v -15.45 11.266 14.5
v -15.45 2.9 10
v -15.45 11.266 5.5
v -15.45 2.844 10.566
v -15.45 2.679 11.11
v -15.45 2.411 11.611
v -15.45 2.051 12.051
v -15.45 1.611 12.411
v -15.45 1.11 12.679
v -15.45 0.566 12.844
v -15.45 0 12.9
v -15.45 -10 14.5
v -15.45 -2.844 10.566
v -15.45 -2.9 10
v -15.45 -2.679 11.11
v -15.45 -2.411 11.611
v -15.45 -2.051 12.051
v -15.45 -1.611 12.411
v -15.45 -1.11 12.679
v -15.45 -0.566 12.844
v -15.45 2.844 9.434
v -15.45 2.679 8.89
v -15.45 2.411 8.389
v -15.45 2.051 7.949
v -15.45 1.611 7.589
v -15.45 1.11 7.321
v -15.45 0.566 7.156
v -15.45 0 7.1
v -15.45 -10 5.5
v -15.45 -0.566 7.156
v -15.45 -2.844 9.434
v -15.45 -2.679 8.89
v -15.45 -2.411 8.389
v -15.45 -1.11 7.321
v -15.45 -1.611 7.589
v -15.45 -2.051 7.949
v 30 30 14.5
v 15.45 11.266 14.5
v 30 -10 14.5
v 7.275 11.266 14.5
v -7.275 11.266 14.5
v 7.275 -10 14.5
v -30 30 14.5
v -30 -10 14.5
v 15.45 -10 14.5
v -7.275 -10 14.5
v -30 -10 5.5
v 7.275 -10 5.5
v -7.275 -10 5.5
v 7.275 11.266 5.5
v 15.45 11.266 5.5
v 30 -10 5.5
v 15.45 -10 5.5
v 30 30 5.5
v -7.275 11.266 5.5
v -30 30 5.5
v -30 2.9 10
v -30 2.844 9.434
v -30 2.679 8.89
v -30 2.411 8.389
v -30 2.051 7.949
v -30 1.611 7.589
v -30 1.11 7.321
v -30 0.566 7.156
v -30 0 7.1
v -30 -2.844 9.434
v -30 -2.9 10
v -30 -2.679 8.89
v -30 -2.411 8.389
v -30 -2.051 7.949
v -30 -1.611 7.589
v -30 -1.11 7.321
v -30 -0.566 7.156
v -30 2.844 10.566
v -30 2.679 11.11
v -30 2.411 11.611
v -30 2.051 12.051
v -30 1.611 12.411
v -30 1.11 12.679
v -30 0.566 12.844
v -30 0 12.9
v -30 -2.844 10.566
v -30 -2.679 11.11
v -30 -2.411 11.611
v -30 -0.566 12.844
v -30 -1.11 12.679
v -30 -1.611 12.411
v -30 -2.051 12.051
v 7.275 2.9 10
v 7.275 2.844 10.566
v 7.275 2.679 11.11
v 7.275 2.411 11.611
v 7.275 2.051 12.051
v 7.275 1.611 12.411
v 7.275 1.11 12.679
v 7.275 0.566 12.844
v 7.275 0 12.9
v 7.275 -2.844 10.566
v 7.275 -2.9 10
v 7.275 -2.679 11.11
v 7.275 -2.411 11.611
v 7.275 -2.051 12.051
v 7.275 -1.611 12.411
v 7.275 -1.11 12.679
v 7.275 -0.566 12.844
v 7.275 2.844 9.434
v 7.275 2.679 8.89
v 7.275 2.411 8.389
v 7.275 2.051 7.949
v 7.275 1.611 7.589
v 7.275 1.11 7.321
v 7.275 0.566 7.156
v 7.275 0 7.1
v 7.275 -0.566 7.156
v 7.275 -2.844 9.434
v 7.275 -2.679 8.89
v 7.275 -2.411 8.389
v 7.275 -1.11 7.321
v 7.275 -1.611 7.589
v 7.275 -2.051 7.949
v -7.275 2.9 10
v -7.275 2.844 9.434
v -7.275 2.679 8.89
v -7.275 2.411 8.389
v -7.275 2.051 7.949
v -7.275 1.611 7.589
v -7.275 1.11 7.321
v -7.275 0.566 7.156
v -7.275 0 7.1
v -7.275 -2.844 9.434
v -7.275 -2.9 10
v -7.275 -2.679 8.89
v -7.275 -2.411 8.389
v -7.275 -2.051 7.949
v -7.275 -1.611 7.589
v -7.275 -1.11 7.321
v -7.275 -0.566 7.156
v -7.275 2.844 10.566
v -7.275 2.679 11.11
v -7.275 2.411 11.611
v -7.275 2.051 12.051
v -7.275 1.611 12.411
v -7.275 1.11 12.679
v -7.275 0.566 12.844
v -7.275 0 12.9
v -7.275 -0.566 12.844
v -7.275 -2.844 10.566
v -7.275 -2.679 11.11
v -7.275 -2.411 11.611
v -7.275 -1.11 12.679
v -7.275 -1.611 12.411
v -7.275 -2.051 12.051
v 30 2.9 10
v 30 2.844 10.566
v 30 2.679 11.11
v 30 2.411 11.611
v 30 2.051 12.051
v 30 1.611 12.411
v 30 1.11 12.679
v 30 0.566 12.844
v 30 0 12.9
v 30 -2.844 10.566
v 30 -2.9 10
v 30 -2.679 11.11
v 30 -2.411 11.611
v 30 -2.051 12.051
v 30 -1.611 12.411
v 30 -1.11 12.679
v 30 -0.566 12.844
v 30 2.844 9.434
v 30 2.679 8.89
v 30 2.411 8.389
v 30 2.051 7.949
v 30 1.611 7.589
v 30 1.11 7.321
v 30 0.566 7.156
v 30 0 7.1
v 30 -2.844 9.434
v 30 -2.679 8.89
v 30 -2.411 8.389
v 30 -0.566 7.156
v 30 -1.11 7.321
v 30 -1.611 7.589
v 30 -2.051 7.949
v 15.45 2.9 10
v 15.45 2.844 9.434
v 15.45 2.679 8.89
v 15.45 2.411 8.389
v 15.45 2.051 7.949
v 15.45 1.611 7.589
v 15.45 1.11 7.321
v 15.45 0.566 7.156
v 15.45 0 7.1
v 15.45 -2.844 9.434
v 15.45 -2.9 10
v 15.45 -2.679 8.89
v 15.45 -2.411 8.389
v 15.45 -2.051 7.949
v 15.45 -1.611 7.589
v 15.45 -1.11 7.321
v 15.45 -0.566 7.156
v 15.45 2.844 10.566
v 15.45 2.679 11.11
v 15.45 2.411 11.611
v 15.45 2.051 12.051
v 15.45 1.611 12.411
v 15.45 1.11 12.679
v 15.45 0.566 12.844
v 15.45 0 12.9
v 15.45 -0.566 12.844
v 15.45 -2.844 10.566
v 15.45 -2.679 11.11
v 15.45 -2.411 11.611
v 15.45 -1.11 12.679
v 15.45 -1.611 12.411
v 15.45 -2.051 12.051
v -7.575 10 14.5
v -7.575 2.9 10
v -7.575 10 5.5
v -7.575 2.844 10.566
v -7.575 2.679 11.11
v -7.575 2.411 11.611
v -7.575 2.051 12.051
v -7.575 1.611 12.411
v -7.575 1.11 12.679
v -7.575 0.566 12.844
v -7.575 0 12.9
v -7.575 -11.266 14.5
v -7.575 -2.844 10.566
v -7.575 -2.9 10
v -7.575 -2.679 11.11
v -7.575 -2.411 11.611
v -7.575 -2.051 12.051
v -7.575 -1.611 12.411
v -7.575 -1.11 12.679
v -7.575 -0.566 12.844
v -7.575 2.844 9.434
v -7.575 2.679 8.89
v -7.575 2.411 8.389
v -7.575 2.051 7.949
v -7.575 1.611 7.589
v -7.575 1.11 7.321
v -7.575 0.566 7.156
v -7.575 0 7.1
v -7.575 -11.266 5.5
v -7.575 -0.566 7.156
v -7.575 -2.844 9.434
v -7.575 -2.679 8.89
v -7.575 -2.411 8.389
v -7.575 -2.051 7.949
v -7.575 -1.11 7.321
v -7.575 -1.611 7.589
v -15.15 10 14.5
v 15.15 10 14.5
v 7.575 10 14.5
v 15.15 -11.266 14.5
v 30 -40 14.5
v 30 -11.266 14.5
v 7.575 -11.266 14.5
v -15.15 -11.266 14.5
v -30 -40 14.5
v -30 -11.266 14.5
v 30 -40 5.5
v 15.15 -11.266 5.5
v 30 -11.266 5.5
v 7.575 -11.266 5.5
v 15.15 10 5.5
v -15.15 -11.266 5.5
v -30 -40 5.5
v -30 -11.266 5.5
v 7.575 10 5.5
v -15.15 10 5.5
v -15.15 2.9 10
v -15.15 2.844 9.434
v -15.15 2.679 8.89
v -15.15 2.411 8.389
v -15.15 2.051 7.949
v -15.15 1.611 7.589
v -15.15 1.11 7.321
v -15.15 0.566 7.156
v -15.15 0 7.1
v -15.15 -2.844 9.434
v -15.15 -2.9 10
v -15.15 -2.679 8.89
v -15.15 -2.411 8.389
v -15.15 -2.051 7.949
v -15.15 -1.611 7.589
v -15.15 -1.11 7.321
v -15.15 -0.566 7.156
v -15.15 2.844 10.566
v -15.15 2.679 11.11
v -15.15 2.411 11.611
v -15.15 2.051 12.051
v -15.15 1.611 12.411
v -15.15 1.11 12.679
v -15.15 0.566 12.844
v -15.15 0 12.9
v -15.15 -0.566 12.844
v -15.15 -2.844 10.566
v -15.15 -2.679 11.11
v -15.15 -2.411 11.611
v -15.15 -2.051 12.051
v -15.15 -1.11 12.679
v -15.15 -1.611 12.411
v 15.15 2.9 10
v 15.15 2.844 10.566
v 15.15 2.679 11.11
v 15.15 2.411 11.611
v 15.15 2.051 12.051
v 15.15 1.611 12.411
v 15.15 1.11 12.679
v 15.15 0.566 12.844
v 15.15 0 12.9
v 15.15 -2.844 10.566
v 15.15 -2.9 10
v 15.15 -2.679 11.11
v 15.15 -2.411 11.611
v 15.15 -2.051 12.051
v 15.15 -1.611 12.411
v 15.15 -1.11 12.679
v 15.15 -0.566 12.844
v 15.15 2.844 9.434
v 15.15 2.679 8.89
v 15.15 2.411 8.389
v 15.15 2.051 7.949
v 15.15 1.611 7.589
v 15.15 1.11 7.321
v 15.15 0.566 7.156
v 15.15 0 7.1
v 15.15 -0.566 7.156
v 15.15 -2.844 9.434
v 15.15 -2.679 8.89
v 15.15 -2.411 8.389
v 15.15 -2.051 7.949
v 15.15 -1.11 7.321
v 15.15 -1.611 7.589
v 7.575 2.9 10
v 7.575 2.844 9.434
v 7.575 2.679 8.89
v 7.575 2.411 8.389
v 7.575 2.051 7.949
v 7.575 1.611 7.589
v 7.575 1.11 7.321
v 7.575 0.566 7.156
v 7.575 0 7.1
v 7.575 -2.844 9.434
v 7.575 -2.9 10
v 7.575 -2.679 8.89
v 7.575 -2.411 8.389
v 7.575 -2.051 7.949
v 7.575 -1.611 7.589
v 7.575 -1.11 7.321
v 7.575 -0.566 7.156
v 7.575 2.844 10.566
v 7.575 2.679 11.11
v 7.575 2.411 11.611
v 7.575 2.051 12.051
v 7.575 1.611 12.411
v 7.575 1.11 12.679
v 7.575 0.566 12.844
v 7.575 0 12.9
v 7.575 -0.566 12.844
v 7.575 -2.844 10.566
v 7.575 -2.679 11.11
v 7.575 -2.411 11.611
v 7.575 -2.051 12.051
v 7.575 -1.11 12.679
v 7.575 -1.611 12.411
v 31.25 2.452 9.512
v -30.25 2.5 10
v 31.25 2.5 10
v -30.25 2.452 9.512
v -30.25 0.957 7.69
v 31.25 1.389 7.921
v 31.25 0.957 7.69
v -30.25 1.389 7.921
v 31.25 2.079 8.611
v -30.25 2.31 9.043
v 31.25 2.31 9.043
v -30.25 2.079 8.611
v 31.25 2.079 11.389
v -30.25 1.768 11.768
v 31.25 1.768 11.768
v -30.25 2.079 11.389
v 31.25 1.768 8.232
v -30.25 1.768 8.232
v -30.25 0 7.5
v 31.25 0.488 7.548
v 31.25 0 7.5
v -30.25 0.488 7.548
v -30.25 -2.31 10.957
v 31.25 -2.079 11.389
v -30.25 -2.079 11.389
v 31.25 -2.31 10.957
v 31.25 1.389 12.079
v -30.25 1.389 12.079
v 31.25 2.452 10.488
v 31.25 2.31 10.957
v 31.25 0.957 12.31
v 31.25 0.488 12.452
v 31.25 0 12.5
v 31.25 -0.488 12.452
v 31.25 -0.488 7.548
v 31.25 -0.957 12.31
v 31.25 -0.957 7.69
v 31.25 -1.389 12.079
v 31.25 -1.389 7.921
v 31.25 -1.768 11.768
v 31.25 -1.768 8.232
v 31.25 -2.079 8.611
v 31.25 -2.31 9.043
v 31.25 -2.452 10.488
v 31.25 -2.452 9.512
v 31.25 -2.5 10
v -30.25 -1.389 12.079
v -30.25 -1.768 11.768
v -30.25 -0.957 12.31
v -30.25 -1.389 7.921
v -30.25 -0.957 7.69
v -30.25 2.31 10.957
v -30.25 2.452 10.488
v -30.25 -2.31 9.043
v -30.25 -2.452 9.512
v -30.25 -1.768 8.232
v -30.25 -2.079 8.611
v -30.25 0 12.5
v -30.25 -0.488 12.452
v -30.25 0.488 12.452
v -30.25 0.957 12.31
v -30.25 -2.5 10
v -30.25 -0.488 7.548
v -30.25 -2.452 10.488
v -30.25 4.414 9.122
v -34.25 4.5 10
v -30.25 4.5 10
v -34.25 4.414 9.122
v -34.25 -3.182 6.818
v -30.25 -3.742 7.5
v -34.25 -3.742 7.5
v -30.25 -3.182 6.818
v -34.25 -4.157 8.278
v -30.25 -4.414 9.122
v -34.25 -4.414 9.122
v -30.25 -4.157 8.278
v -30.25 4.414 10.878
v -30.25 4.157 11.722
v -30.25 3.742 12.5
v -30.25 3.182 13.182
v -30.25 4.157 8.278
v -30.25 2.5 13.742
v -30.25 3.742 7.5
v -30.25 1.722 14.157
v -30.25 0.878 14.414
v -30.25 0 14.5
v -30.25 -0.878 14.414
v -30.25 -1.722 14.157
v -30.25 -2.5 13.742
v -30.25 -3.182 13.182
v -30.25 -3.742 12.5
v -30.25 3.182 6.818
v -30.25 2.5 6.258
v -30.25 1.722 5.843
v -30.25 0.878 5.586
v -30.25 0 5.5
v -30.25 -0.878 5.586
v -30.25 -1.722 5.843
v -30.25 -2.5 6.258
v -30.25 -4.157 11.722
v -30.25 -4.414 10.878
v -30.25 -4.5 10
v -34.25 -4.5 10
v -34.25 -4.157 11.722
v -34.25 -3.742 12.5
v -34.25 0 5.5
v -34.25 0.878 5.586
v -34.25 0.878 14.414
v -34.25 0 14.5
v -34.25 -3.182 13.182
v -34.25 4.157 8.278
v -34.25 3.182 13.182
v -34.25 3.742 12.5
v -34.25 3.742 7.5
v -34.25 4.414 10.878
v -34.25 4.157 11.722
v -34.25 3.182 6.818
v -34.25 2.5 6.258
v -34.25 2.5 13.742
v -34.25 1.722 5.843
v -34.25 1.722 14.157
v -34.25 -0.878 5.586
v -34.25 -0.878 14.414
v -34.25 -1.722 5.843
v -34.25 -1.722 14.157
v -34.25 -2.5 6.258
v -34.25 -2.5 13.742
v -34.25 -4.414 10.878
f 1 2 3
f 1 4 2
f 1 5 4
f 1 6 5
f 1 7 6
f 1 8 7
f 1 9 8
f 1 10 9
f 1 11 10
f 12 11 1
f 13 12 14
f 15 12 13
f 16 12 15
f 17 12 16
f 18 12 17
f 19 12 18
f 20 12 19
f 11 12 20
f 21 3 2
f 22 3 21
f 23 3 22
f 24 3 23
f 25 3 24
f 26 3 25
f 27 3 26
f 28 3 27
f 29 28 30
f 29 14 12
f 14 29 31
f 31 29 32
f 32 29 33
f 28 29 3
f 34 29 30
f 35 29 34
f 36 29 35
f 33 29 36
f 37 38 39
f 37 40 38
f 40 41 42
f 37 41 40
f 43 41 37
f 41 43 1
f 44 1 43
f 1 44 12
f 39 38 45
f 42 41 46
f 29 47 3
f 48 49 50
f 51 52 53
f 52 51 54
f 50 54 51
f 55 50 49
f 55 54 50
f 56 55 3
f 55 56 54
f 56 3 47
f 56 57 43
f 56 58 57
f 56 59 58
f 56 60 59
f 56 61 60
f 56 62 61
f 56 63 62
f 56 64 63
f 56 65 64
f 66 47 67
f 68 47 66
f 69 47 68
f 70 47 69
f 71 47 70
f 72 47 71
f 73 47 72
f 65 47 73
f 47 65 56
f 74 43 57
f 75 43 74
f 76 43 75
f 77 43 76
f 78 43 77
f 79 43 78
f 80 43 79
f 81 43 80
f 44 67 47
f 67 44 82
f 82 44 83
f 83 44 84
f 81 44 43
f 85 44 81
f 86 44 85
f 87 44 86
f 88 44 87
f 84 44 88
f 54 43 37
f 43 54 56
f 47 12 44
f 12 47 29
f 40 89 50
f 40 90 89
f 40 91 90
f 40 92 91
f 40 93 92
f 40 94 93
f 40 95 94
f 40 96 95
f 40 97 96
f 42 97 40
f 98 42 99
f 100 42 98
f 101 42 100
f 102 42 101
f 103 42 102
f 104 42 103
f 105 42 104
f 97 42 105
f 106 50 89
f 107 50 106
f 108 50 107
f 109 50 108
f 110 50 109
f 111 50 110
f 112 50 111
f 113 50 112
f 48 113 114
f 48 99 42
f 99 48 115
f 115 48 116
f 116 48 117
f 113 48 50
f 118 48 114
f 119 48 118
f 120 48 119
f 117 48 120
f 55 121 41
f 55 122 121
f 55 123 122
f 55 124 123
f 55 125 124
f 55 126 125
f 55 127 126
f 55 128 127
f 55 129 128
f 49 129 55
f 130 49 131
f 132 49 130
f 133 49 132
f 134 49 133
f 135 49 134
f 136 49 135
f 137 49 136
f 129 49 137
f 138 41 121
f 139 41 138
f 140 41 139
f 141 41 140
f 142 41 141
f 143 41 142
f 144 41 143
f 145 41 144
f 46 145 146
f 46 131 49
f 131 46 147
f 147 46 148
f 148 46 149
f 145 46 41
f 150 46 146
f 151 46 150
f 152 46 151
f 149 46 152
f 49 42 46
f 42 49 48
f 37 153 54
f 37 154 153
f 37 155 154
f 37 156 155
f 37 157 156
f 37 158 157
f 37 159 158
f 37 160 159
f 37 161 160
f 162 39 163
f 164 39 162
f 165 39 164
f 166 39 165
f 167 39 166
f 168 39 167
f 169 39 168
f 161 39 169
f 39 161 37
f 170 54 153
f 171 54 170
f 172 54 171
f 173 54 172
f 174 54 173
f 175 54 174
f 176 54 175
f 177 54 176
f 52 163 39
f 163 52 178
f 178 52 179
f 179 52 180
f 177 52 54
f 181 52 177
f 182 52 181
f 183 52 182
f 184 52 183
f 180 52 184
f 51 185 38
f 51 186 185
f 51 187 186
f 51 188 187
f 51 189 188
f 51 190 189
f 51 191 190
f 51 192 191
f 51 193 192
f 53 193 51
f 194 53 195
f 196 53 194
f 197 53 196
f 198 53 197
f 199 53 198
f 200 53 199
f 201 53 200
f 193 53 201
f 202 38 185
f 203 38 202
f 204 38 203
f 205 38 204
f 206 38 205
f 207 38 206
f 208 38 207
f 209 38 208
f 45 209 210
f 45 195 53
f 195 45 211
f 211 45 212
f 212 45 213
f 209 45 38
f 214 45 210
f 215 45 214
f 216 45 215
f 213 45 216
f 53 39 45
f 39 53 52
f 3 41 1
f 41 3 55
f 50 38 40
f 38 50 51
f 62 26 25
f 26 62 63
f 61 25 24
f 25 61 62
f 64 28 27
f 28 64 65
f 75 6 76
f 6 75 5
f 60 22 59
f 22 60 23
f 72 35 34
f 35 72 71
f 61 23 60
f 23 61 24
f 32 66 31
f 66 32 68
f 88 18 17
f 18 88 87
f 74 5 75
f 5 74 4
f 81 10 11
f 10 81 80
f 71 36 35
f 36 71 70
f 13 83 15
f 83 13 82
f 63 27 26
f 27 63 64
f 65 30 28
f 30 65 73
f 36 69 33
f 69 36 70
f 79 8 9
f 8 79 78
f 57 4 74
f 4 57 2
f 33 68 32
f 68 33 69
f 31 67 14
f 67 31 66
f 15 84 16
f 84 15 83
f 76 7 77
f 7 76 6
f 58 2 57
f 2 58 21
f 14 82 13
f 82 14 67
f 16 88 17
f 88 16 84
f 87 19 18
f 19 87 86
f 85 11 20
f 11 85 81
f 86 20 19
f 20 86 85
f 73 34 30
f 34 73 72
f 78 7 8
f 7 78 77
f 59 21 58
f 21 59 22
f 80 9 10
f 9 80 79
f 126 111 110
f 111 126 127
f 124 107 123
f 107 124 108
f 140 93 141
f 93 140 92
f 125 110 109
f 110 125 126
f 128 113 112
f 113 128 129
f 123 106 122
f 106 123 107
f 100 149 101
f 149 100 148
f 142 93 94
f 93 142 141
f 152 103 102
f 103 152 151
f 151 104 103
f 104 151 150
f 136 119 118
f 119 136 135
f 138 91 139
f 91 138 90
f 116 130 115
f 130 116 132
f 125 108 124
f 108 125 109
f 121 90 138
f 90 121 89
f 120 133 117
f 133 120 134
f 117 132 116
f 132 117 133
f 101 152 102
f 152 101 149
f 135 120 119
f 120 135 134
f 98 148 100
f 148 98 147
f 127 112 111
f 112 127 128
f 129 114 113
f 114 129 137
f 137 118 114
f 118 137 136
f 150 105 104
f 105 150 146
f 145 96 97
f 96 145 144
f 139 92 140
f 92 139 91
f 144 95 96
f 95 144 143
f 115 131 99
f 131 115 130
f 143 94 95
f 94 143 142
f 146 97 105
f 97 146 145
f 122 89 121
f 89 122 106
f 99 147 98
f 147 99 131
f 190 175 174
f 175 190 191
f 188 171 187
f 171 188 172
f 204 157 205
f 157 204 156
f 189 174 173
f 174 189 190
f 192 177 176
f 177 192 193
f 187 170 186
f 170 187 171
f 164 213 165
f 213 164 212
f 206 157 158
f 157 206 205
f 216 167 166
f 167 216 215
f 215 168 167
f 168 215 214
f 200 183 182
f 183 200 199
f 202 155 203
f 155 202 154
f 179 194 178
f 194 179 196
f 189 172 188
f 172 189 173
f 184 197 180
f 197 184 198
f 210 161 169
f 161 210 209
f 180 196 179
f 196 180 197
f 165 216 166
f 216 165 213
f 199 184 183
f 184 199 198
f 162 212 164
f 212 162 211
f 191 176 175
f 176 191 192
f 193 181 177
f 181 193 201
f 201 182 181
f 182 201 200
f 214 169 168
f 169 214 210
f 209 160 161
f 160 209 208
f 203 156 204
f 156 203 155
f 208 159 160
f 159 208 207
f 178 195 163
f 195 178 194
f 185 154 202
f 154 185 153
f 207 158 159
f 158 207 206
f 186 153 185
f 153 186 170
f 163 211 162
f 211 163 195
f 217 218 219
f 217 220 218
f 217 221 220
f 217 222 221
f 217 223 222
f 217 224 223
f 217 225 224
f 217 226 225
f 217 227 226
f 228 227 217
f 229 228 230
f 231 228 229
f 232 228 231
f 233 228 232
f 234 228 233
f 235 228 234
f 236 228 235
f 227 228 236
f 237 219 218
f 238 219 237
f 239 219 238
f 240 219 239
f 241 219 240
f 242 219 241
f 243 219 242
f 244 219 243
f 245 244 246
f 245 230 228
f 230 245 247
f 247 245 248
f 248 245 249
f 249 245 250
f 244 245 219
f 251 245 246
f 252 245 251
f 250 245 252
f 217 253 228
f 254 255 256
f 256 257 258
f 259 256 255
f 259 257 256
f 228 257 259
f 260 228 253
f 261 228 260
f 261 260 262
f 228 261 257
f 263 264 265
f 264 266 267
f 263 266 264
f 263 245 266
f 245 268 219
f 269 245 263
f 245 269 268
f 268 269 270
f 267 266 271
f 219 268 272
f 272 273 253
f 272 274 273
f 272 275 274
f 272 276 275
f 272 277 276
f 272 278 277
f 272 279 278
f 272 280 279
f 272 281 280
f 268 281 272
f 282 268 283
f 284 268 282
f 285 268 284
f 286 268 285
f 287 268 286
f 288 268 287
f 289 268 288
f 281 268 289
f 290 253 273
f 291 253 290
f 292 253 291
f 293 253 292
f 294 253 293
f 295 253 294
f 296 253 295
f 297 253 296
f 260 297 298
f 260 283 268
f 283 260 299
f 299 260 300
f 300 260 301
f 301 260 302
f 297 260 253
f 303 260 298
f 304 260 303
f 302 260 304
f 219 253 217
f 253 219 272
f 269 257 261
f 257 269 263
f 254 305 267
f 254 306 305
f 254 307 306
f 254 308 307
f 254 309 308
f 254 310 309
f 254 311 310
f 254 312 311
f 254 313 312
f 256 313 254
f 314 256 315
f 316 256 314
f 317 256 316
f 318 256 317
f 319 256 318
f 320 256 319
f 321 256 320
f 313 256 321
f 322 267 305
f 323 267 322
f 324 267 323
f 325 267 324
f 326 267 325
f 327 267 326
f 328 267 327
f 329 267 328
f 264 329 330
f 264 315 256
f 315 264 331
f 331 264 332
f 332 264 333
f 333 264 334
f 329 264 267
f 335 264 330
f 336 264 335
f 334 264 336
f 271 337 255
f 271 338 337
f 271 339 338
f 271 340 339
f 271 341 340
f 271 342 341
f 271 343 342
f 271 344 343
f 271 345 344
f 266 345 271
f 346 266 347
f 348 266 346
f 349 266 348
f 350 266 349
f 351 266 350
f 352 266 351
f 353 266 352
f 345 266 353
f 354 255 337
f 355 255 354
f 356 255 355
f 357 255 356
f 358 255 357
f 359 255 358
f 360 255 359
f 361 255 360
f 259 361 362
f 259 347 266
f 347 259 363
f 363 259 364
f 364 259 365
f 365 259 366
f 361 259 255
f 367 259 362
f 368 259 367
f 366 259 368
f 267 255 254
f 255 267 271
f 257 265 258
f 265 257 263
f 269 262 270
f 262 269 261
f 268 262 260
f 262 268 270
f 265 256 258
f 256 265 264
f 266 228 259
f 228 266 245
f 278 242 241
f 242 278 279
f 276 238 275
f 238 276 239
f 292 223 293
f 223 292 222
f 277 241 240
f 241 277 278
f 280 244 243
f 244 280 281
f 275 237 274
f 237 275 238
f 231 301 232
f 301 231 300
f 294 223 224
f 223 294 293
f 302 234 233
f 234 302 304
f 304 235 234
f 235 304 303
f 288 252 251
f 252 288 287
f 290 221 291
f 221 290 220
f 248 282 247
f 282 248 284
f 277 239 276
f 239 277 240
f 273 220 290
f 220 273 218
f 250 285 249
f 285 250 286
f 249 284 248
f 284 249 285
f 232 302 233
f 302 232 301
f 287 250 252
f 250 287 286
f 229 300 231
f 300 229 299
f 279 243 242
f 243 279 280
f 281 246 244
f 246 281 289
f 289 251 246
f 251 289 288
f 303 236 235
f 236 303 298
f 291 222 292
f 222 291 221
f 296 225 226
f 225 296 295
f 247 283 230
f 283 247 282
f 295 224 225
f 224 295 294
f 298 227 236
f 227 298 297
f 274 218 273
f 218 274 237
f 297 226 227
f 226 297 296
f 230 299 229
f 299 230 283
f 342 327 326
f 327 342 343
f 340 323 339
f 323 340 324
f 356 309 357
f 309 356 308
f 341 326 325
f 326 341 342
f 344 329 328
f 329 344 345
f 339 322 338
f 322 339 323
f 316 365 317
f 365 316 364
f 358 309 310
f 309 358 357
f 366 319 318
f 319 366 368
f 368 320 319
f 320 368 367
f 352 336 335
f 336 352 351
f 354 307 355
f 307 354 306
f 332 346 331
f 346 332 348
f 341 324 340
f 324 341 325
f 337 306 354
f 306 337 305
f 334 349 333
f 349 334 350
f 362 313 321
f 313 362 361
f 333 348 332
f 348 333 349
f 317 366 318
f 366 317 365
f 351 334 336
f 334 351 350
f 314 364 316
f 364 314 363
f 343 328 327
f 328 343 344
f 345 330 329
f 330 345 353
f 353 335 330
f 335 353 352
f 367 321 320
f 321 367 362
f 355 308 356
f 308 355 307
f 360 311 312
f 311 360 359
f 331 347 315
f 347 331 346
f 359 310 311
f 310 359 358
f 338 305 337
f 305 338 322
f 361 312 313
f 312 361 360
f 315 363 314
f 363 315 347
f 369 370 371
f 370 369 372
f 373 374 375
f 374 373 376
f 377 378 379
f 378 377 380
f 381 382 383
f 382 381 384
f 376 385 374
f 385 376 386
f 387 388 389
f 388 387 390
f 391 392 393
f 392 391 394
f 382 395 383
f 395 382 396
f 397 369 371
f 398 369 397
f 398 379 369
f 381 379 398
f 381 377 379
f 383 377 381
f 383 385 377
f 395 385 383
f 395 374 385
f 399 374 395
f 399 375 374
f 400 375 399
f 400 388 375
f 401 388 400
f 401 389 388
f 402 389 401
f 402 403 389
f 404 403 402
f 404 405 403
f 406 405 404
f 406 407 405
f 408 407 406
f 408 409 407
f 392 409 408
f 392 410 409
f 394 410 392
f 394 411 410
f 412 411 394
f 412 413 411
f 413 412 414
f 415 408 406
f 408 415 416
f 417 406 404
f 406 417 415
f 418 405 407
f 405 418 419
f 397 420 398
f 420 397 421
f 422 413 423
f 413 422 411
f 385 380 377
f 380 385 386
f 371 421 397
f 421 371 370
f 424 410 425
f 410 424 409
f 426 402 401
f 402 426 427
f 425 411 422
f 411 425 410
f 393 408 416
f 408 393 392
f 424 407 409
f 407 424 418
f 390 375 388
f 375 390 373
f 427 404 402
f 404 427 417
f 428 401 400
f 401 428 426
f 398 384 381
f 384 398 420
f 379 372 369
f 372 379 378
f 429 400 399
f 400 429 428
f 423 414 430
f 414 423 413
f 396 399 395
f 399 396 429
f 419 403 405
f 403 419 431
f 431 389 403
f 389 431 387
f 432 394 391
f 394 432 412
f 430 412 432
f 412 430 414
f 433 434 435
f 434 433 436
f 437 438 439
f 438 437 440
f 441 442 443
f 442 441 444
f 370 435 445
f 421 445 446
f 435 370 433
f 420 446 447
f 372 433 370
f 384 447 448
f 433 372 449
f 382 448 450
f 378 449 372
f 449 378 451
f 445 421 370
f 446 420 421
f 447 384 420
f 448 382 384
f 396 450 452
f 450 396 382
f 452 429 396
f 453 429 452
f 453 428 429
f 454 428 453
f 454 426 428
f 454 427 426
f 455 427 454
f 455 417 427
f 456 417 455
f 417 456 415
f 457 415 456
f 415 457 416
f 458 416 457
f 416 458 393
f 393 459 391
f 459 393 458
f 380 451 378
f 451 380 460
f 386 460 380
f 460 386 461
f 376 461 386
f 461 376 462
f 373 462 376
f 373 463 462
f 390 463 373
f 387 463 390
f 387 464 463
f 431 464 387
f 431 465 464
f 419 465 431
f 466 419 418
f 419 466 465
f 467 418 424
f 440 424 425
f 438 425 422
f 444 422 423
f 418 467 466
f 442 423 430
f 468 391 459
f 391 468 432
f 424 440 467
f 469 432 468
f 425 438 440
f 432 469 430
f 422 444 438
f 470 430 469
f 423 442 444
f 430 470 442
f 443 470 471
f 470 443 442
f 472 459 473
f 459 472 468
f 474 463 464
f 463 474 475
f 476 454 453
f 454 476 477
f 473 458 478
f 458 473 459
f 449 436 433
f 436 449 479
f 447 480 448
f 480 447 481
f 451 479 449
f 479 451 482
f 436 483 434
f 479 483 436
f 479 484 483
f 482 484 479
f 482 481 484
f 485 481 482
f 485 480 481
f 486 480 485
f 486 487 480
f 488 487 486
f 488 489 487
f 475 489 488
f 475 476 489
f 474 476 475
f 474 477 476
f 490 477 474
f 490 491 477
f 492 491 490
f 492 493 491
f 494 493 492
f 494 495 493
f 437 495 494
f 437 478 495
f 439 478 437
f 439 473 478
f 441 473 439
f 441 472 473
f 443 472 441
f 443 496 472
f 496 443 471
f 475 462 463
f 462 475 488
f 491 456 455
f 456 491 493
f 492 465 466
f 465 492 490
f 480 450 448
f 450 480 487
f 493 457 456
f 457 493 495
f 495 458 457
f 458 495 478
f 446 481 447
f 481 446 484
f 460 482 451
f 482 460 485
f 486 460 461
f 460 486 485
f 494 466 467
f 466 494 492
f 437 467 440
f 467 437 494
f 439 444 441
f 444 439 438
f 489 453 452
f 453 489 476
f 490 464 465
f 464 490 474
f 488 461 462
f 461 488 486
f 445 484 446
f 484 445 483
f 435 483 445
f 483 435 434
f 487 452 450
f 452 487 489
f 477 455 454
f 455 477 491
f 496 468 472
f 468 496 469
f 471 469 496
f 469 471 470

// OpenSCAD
$fn = 32;

// ------------------------------------------------------------------------
// Butt hinge: hinge 60 mm, leaf swung 0 deg
// Every part is its own module, assembly() places every instance.
// ------------------------------------------------------------------------

// --- part 1 ---
module hinge_base() {
  difference() {
    union() {
      translate([-30, -10, -4.5]) cube([14.55, 40, 9]);
      translate([-7.275, -10, -4.5]) cube([14.55, 40, 9]);
      translate([15.45, -10, -4.5]) cube([14.55, 40, 9]);
      translate([-30, 11.266, -4.5]) cube([60, 18.734, 9]);
    }
    translate([-22.725, 0, 0]) rotate([0, 90, 0]) cylinder(h = 16.55, d = 5.8, center = true);
    translate([0, 0, 0]) rotate([0, 90, 0]) cylinder(h = 16.55, d = 5.8, center = true);
    translate([22.725, 0, 0]) rotate([0, 90, 0]) cylinder(h = 16.55, d = 5.8, center = true);
  }
}

// --- part 2 ---
module hinge_mover() {
  difference() {
    union() {
      translate([-15.15, -40, -4.5]) cube([7.575, 50, 9]);
      translate([7.575, -40, -4.5]) cube([7.575, 50, 9]);
      translate([-30, -40, -4.5]) cube([60, 28.734, 9]);
    }
    translate([-11.362, 0, 0]) rotate([0, 90, 0]) cylinder(h = 9.575, d = 5.8, center = true);
    translate([11.362, 0, 0]) rotate([0, 90, 0]) cylinder(h = 9.575, d = 5.8, center = true);
  }
}

// --- part 3 ---
module hinge_pin() {
  rotate([0, 90, 0]) cylinder(h = 62.5, d = 5, center = true);
  translate([-34.25, 0, 0]) rotate([0, 90, 0]) cylinder(h = 4, d = 9);
}

// --- assembly ---
module assembly() {
  color([0.80, 0.24, 0.20]) translate([0, 0, 10]) rotate([0, 0, 0]) hinge_base();
  color([0.20, 0.45, 0.75]) translate([0, 0, 10]) rotate([0, 0, 0]) hinge_mover();
  color([0.25, 0.62, 0.32]) translate([0, 0, 10]) rotate([0, 0, 0]) hinge_pin();
}

assembly();
